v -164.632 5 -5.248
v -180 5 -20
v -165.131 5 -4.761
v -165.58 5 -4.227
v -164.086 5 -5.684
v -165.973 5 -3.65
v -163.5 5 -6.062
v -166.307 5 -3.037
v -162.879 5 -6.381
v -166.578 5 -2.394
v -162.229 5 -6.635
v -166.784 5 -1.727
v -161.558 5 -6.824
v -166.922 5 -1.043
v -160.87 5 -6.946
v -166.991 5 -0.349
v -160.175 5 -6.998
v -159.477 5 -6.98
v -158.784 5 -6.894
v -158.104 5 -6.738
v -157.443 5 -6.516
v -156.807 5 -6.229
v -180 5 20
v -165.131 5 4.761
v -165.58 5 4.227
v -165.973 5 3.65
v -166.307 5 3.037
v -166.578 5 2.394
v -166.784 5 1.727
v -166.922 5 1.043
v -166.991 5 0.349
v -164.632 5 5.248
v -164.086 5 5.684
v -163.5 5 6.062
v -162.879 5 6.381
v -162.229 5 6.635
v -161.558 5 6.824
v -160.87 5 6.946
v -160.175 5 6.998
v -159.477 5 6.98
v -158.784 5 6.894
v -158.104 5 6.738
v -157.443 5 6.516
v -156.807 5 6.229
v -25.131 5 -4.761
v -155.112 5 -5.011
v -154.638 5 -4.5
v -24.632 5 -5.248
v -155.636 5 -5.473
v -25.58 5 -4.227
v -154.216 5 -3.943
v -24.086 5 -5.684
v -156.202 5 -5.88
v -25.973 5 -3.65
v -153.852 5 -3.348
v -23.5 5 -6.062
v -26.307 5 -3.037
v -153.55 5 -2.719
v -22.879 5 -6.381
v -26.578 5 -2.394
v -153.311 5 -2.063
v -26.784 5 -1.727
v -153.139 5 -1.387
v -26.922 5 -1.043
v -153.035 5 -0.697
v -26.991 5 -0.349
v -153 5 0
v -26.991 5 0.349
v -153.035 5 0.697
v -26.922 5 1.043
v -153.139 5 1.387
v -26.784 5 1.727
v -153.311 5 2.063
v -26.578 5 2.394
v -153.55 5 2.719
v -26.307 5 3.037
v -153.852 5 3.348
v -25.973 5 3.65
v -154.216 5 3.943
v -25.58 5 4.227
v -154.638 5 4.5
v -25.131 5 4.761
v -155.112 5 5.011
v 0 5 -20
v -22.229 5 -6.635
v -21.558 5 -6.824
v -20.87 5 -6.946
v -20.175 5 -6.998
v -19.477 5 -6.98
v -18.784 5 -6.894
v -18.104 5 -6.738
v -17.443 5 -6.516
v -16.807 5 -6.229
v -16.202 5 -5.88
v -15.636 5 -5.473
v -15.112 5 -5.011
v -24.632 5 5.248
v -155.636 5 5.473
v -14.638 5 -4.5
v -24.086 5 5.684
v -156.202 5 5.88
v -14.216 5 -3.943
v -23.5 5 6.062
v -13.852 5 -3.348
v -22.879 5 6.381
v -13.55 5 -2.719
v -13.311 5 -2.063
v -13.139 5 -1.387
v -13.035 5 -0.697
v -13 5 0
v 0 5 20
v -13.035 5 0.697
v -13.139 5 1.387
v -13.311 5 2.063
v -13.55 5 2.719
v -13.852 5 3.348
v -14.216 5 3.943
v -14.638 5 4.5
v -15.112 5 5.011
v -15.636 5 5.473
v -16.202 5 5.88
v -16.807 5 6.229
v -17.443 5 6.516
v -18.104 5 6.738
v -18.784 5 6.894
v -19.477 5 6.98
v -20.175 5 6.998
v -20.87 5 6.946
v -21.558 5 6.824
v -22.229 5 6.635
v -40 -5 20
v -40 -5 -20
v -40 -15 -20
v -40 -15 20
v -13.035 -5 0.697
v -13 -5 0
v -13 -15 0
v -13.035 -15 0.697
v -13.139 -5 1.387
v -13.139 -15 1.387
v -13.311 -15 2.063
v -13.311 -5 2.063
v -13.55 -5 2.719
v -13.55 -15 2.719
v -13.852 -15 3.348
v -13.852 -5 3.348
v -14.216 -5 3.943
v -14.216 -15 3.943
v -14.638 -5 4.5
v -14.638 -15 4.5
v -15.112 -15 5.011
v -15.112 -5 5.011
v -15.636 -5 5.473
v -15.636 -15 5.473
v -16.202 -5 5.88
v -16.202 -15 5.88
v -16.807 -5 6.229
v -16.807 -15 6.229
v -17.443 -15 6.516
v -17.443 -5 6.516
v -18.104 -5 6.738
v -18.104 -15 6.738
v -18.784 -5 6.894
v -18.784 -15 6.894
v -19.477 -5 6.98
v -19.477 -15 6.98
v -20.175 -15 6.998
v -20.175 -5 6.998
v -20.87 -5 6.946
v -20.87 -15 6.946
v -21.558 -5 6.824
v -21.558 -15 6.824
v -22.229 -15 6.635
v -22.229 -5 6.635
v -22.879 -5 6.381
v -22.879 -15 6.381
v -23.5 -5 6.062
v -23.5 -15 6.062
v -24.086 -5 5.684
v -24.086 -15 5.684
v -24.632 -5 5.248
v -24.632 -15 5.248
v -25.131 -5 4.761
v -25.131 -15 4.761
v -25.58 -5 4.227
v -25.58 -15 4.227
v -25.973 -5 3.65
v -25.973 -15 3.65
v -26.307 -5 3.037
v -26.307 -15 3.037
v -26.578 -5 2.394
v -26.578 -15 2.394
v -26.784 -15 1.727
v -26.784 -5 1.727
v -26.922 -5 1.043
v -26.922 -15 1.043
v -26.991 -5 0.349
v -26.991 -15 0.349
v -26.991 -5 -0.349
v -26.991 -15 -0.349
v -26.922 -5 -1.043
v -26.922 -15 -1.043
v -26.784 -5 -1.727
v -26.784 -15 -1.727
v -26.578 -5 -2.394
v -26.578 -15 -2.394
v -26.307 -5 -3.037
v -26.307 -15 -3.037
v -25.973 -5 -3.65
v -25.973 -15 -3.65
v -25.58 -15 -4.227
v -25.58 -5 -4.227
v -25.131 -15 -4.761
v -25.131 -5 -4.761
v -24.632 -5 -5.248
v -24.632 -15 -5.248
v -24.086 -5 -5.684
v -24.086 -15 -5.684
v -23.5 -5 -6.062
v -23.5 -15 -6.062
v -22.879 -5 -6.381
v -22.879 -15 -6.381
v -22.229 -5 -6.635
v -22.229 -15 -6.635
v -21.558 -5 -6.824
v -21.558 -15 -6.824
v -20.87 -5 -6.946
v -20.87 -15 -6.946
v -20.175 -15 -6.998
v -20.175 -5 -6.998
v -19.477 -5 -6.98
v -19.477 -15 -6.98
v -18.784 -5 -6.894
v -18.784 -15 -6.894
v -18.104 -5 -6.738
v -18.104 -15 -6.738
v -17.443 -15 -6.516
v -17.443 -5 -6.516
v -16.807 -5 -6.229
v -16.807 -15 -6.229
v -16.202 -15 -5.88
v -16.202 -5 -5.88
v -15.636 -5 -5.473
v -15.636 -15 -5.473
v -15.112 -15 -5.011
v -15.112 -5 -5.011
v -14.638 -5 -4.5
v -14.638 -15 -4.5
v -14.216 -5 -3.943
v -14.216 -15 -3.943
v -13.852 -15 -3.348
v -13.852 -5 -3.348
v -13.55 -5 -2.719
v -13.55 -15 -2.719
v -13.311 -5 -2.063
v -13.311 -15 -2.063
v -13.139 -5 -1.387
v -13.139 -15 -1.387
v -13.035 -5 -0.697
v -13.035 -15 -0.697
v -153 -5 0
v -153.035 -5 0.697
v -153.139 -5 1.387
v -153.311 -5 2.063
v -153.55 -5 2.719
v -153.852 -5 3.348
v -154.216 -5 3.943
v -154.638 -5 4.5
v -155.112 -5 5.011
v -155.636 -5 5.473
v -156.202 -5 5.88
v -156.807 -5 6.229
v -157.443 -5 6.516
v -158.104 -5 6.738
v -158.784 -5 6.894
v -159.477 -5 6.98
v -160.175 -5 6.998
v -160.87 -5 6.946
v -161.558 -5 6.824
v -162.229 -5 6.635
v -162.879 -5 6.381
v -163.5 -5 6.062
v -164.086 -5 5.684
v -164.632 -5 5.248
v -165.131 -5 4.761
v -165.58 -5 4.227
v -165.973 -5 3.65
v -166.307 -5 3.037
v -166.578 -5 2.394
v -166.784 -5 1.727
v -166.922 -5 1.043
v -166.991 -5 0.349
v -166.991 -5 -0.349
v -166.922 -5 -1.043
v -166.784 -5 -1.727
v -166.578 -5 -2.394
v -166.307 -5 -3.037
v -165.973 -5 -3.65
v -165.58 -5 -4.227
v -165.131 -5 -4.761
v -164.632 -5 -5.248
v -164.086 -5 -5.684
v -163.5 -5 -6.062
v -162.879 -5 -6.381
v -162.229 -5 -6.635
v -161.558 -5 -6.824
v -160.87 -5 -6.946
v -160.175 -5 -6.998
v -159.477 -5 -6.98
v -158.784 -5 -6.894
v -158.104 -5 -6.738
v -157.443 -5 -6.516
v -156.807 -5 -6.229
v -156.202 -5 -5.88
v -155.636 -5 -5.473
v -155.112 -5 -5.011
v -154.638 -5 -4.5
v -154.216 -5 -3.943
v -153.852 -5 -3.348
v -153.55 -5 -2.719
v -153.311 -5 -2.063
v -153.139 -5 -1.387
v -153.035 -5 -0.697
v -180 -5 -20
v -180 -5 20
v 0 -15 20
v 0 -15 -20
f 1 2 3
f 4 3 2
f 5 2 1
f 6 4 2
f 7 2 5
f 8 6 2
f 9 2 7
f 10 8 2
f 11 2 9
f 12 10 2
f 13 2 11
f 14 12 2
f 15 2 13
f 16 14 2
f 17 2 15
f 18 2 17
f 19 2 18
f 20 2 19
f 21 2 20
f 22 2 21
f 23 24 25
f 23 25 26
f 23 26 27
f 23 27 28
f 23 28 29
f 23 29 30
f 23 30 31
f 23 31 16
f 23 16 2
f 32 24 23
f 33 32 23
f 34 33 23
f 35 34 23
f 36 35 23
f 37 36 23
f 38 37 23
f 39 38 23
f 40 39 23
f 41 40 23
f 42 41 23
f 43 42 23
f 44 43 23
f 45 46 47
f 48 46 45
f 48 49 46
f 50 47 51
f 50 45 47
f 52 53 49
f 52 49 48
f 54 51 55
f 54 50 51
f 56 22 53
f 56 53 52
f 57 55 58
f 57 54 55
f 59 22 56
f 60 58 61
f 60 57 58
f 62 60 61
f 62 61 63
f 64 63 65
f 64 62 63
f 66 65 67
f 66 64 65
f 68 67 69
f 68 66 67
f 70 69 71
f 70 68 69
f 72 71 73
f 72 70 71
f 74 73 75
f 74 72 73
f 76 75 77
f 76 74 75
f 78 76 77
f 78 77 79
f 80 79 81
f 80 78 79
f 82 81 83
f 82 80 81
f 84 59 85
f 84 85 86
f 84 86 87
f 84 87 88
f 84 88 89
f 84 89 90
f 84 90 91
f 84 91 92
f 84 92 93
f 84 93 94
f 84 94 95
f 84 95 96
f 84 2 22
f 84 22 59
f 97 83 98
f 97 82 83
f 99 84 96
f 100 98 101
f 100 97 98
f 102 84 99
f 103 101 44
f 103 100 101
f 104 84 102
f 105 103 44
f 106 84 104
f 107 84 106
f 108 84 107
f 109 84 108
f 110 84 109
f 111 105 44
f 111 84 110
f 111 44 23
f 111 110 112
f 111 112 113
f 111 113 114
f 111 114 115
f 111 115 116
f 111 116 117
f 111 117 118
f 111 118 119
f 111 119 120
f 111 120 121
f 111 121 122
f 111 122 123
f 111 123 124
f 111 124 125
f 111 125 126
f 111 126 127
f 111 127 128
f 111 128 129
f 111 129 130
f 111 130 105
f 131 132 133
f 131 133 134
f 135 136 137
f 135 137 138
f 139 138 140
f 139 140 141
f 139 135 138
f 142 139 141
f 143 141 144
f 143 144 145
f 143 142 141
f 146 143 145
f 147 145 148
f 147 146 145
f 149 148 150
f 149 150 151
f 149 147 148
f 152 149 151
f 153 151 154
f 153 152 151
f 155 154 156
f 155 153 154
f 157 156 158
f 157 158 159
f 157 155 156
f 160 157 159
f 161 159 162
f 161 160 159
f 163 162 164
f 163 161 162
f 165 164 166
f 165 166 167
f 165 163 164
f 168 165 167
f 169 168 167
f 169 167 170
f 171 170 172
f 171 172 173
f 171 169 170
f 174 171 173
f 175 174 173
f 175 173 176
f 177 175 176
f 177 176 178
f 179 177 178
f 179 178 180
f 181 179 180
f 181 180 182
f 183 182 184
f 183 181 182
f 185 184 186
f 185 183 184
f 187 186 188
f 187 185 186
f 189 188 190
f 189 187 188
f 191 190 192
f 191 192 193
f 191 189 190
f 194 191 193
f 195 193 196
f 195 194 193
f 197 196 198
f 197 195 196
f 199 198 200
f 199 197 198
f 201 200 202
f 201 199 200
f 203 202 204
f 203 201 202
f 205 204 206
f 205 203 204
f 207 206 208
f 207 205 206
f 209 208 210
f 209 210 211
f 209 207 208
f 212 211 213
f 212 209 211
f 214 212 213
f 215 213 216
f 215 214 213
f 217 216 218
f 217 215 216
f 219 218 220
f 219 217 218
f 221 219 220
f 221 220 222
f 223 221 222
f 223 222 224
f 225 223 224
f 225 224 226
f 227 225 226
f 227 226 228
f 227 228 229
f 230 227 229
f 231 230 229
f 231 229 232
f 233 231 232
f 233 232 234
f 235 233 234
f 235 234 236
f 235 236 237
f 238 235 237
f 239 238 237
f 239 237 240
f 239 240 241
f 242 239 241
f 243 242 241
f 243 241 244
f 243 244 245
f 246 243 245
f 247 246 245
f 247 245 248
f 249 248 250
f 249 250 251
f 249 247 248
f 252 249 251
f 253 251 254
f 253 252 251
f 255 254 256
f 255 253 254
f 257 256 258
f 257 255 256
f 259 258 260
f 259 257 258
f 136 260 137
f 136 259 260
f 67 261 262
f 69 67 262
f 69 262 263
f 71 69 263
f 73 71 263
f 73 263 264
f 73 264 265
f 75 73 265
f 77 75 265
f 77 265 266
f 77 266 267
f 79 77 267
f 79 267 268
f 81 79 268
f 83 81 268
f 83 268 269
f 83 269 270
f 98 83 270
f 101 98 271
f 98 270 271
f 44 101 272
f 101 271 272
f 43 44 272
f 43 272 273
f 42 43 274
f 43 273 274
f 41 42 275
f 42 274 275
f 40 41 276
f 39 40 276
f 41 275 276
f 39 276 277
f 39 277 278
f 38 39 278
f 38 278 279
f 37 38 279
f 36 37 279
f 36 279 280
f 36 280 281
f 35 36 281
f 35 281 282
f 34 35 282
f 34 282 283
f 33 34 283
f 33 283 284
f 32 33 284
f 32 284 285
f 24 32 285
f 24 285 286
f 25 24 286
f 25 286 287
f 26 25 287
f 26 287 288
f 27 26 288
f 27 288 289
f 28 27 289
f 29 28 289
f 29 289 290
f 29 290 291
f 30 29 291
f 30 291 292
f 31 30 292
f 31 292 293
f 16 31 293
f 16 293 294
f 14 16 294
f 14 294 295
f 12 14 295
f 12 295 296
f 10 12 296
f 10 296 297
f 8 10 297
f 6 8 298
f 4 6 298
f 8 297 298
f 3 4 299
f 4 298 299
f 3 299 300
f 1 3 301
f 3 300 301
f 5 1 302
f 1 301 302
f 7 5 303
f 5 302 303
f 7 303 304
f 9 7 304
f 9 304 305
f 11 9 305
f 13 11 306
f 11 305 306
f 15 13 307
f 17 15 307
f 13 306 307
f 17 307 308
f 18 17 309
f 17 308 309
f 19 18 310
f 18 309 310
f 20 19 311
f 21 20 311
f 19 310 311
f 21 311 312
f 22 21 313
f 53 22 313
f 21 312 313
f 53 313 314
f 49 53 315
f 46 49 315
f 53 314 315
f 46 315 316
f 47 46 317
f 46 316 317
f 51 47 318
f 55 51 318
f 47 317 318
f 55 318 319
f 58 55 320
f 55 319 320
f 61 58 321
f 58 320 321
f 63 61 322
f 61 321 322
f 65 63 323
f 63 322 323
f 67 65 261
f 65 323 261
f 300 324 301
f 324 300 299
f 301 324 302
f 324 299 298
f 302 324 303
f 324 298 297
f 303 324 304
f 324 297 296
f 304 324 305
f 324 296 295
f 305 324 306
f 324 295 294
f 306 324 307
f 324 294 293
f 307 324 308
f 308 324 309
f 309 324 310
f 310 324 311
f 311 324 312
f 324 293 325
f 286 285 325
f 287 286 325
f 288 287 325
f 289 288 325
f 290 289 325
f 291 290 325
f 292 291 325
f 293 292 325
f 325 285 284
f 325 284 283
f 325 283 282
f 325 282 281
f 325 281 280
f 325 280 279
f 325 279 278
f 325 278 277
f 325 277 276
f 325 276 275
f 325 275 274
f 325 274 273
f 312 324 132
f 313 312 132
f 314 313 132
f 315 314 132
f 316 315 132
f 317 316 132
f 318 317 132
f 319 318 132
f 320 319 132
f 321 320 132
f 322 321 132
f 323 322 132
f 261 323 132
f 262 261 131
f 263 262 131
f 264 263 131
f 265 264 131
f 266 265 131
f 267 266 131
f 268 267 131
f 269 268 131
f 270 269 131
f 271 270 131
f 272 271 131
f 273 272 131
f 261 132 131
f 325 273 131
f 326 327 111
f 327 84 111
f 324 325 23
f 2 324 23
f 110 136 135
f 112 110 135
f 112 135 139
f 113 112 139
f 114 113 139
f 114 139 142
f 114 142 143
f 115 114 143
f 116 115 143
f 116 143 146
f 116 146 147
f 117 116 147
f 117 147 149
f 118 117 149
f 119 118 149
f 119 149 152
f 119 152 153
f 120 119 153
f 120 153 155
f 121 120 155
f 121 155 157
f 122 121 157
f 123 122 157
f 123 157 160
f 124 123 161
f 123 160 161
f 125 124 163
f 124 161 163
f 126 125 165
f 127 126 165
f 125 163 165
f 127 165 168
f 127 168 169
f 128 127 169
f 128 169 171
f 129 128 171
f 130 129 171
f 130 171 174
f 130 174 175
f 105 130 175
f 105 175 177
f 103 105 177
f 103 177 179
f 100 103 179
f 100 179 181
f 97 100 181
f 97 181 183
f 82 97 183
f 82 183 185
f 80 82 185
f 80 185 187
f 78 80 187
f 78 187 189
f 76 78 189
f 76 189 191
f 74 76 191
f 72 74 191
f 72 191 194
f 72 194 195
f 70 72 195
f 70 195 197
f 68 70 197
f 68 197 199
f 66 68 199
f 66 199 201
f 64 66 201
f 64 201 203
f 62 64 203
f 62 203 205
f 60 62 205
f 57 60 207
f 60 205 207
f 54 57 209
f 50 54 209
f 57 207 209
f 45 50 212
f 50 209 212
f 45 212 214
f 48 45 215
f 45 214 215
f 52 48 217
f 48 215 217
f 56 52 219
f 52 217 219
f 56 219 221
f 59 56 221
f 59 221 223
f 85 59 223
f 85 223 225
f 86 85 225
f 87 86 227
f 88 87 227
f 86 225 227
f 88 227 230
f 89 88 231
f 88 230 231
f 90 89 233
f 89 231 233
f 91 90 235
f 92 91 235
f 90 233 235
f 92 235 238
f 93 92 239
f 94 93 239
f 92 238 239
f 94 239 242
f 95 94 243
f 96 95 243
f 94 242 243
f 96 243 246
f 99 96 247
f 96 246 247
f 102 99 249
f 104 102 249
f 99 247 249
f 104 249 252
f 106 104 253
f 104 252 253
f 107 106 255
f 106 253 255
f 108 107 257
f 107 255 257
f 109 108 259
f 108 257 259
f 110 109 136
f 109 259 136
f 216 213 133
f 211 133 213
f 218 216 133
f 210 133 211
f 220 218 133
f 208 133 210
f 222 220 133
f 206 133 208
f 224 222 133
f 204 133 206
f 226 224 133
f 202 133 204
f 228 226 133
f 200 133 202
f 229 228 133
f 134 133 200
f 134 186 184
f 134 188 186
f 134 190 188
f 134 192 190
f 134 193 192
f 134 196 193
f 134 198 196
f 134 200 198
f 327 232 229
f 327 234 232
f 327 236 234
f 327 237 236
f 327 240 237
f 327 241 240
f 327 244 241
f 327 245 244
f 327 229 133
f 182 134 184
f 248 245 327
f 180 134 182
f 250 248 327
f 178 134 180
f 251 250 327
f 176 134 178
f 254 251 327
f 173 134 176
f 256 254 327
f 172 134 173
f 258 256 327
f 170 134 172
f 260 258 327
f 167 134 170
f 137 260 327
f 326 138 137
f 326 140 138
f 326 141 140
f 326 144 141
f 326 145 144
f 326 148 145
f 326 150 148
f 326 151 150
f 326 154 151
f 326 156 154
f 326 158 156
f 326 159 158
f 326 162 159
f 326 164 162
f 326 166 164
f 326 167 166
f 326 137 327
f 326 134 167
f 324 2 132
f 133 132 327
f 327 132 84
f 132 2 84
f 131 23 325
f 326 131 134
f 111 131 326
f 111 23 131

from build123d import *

# Parameters (mm, degrees)
F0_W     = 10
F0_H     = 40
F1_DEPTH = 180
F2_R     = 7
F3_DEPTH = 10.001
F4_W     = 40
F4_H     = 40
F4_R     = 7
F5_DEPTH = 10


with BuildPart() as f1:
    # F0 (on Right) → F1 (new body)
    with BuildSketch(Plane.YZ):
        Rectangle(F0_W, F0_H)
    extrude(amount=-F1_DEPTH)

    # F2 (on face) → F3 (cut, through all)
    with BuildSketch(Plane.XZ.offset(5)):
        with Locations((-160, 0)):
            Circle(F2_R)
        with Locations((-20, 0)):
            Circle(F2_R)
    extrude(amount=-F3_DEPTH, mode=Mode.SUBTRACT)

    # F4 (on face) → F5 (join)
    with BuildSketch(Plane.XZ.offset(5)):
        with Locations((-20, 0)):
            Rectangle(F4_W, F4_H)
        with Locations((-20, 0)):
            Circle(F4_R, mode=Mode.SUBTRACT)
    extrude(amount=F5_DEPTH)


solid = f1.part
